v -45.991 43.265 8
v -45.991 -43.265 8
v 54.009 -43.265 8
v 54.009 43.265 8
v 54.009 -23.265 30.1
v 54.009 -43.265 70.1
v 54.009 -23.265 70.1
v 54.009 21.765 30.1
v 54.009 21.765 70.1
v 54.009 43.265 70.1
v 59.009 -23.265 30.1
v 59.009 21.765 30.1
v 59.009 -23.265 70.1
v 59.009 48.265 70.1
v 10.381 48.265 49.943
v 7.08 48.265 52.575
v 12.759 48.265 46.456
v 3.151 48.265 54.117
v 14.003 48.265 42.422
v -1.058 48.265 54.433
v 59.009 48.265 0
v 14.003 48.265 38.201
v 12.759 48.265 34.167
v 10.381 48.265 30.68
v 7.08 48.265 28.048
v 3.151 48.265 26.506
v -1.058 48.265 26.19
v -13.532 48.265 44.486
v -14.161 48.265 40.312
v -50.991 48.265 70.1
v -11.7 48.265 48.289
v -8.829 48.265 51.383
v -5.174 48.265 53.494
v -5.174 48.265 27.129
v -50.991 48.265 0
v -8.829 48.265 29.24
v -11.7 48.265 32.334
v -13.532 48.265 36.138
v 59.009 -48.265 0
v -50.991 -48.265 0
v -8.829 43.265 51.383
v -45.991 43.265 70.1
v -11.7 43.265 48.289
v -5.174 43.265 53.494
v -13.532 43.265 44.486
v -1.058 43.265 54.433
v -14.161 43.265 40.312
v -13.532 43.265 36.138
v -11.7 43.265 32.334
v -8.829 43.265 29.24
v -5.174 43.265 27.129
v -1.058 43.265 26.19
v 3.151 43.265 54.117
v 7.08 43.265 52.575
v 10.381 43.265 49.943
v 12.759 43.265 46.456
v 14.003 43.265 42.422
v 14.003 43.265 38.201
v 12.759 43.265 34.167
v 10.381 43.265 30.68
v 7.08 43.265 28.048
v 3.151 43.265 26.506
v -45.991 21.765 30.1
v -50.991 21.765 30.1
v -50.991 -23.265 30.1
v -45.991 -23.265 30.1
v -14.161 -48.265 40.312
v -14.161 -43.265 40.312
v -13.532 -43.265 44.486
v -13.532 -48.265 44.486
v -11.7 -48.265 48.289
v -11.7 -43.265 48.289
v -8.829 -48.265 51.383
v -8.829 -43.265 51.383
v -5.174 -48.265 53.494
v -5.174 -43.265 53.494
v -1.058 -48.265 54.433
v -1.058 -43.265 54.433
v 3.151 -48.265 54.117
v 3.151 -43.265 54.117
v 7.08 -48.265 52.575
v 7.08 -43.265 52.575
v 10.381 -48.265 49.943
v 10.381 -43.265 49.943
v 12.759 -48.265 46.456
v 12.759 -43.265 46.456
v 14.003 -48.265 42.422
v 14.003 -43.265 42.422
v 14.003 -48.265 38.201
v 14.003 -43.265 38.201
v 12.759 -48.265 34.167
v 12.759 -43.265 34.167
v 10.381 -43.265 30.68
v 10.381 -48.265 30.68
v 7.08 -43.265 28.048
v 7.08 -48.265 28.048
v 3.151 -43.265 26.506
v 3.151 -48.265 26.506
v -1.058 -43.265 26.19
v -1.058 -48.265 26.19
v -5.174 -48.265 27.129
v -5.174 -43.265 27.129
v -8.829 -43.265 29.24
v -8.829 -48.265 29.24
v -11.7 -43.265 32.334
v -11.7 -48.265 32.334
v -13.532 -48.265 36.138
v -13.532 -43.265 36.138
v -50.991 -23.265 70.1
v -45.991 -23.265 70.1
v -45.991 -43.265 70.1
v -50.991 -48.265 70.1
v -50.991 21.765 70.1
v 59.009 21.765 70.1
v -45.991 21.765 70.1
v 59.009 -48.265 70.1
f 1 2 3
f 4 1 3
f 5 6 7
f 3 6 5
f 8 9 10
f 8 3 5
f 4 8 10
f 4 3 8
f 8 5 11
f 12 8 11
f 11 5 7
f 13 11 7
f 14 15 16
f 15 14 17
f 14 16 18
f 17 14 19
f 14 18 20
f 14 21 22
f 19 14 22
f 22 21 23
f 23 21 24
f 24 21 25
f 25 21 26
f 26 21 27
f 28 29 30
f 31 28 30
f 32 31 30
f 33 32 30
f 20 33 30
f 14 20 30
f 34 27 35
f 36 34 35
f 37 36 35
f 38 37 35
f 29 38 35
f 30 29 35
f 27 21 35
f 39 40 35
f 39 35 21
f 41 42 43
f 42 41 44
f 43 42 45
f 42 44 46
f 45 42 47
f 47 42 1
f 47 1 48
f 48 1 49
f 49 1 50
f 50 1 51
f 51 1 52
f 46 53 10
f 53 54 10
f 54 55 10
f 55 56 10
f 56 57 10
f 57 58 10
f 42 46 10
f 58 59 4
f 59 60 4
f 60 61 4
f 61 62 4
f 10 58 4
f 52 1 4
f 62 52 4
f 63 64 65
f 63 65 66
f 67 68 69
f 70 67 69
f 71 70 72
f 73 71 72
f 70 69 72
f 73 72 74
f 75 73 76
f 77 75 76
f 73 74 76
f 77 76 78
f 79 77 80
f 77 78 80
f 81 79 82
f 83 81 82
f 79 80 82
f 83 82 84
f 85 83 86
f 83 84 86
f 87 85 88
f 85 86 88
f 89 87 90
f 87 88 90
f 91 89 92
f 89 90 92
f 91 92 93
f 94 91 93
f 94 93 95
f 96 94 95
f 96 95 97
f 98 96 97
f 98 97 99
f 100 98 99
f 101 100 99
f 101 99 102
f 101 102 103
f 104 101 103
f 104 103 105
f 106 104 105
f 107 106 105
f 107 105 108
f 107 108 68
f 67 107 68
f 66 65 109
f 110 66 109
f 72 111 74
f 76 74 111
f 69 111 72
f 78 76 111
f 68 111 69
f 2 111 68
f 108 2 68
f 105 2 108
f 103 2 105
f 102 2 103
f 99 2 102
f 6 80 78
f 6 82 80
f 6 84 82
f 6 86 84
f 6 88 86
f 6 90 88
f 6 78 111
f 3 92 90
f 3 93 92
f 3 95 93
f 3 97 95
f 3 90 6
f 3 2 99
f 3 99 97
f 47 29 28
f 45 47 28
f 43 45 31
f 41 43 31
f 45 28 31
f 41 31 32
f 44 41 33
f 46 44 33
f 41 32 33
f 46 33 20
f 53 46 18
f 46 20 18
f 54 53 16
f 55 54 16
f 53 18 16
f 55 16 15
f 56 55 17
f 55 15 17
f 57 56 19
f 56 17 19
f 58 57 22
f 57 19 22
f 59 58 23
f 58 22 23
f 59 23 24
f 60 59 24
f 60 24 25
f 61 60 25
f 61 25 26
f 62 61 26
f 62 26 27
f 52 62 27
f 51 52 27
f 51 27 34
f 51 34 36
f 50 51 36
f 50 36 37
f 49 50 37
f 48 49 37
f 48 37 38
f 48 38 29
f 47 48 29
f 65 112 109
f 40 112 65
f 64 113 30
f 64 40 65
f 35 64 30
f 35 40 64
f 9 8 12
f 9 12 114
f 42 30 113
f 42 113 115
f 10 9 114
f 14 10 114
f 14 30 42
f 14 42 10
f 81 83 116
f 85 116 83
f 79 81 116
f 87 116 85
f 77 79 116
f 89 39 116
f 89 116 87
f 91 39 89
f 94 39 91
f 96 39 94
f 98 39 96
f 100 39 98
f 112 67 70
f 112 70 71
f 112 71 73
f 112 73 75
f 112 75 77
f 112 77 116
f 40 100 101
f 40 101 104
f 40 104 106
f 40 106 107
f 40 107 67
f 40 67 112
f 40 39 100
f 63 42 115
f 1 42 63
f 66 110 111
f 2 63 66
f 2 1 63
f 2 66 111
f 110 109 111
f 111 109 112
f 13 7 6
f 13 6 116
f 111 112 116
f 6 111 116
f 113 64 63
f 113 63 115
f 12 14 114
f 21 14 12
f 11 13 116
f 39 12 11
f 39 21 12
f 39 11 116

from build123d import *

# Parameters (mm, degrees)
F0_W      = 110
F0_H      = 70
F1_DEPTH  = 8
F2_W      = 5
F2_H      = 40
F2_H_2    = 25
F3_DEPTH  = 62.1
F4_W      = 28
F4_H      = 40
F5_DEPTH  = 117.8
F7_DEPTH  = 15.5
F8_DEPTH  = 17
F9_R      = 14.1609686348
F10_DEPTH = 96.5309327604


with BuildPart() as f1:
    # F0 (on Top) → F1 (new body)
    with BuildSketch(Plane.XY):
        with Locations((4.0090922266, 13.2649663802)):
            Rectangle(F0_W, F0_H)
    extrude(amount=F1_DEPTH)

    # F2 (on face) → F3 (join)
    with BuildSketch(Plane.XY.offset(8)):
        Polygon((59.0090922266, 48.2649663802), (-50.9909077734, 48.2649663802), (-50.9909077734, 43.2649663802), (-45.9909077734, 43.2649663802), (54.0090922266, 43.2649663802), (59.0090922266, 43.2649663802), align=None)
        with Locations((-48.4909077734, 23.2649663802)):
            Rectangle(F2_W, F2_H)
        with Locations((56.5090922266, 23.2649663802)):
            Rectangle(F2_W, F2_H)
        with Locations((-48.4909077734, -9.2350336198)):
            Rectangle(F2_W, F2_H_2)
        with Locations((56.5090922266, -9.2350336198)):
            Rectangle(F2_W, F2_H_2)
    extrude(amount=F3_DEPTH)

    # F4 (on face) → F5 (cut)
    with BuildSketch(Plane(origin=(-50.9909077734, 0, 0), x_dir=(0, -1, 0), z_dir=(-1, 0, 0))):
        with Locations((7.7350336198, 50.1)):
            Rectangle(F4_W, F4_H)
    extrude(amount=-F5_DEPTH, mode=Mode.SUBTRACT)

    # F6: F1 across plane


with BuildPart() as f1_1:
    add(f1.part)
    add(f1.part.mirror(Plane.XZ))

    # F7 (cut): faces of the model
    f7_faces = [f1_1.faces().sort_by_distance(p)[0] for p in [
        (-48.4909077734, 6.2649663802, 50.1),
        (56.5090922266, 6.2649663802, 50.1),
    ]]
    extrude(f7_faces, amount=-F7_DEPTH, mode=Mode.SUBTRACT)

    # F8 (cut): faces of the model
    f8_faces = [f1_1.faces().sort_by_distance(p)[0] for p in [
        (56.5090922266, -6.2649663802, 50.1),
        (-48.4909077734, -6.2649663802, 50.1),
    ]]
    extrude(f8_faces, amount=-F8_DEPTH, mode=Mode.SUBTRACT)

    # F9 (on face) → F10 (cut, through all)
    with BuildSketch(Plane(origin=(0, 48.2649663802, 0), x_dir=(-1, 0, 0), z_dir=(0, 1, 0))):
        with Locations((0, 40.3115488589)):
            Circle(F9_R)
    extrude(amount=-F10_DEPTH, mode=Mode.SUBTRACT)


solid = f1_1.part
